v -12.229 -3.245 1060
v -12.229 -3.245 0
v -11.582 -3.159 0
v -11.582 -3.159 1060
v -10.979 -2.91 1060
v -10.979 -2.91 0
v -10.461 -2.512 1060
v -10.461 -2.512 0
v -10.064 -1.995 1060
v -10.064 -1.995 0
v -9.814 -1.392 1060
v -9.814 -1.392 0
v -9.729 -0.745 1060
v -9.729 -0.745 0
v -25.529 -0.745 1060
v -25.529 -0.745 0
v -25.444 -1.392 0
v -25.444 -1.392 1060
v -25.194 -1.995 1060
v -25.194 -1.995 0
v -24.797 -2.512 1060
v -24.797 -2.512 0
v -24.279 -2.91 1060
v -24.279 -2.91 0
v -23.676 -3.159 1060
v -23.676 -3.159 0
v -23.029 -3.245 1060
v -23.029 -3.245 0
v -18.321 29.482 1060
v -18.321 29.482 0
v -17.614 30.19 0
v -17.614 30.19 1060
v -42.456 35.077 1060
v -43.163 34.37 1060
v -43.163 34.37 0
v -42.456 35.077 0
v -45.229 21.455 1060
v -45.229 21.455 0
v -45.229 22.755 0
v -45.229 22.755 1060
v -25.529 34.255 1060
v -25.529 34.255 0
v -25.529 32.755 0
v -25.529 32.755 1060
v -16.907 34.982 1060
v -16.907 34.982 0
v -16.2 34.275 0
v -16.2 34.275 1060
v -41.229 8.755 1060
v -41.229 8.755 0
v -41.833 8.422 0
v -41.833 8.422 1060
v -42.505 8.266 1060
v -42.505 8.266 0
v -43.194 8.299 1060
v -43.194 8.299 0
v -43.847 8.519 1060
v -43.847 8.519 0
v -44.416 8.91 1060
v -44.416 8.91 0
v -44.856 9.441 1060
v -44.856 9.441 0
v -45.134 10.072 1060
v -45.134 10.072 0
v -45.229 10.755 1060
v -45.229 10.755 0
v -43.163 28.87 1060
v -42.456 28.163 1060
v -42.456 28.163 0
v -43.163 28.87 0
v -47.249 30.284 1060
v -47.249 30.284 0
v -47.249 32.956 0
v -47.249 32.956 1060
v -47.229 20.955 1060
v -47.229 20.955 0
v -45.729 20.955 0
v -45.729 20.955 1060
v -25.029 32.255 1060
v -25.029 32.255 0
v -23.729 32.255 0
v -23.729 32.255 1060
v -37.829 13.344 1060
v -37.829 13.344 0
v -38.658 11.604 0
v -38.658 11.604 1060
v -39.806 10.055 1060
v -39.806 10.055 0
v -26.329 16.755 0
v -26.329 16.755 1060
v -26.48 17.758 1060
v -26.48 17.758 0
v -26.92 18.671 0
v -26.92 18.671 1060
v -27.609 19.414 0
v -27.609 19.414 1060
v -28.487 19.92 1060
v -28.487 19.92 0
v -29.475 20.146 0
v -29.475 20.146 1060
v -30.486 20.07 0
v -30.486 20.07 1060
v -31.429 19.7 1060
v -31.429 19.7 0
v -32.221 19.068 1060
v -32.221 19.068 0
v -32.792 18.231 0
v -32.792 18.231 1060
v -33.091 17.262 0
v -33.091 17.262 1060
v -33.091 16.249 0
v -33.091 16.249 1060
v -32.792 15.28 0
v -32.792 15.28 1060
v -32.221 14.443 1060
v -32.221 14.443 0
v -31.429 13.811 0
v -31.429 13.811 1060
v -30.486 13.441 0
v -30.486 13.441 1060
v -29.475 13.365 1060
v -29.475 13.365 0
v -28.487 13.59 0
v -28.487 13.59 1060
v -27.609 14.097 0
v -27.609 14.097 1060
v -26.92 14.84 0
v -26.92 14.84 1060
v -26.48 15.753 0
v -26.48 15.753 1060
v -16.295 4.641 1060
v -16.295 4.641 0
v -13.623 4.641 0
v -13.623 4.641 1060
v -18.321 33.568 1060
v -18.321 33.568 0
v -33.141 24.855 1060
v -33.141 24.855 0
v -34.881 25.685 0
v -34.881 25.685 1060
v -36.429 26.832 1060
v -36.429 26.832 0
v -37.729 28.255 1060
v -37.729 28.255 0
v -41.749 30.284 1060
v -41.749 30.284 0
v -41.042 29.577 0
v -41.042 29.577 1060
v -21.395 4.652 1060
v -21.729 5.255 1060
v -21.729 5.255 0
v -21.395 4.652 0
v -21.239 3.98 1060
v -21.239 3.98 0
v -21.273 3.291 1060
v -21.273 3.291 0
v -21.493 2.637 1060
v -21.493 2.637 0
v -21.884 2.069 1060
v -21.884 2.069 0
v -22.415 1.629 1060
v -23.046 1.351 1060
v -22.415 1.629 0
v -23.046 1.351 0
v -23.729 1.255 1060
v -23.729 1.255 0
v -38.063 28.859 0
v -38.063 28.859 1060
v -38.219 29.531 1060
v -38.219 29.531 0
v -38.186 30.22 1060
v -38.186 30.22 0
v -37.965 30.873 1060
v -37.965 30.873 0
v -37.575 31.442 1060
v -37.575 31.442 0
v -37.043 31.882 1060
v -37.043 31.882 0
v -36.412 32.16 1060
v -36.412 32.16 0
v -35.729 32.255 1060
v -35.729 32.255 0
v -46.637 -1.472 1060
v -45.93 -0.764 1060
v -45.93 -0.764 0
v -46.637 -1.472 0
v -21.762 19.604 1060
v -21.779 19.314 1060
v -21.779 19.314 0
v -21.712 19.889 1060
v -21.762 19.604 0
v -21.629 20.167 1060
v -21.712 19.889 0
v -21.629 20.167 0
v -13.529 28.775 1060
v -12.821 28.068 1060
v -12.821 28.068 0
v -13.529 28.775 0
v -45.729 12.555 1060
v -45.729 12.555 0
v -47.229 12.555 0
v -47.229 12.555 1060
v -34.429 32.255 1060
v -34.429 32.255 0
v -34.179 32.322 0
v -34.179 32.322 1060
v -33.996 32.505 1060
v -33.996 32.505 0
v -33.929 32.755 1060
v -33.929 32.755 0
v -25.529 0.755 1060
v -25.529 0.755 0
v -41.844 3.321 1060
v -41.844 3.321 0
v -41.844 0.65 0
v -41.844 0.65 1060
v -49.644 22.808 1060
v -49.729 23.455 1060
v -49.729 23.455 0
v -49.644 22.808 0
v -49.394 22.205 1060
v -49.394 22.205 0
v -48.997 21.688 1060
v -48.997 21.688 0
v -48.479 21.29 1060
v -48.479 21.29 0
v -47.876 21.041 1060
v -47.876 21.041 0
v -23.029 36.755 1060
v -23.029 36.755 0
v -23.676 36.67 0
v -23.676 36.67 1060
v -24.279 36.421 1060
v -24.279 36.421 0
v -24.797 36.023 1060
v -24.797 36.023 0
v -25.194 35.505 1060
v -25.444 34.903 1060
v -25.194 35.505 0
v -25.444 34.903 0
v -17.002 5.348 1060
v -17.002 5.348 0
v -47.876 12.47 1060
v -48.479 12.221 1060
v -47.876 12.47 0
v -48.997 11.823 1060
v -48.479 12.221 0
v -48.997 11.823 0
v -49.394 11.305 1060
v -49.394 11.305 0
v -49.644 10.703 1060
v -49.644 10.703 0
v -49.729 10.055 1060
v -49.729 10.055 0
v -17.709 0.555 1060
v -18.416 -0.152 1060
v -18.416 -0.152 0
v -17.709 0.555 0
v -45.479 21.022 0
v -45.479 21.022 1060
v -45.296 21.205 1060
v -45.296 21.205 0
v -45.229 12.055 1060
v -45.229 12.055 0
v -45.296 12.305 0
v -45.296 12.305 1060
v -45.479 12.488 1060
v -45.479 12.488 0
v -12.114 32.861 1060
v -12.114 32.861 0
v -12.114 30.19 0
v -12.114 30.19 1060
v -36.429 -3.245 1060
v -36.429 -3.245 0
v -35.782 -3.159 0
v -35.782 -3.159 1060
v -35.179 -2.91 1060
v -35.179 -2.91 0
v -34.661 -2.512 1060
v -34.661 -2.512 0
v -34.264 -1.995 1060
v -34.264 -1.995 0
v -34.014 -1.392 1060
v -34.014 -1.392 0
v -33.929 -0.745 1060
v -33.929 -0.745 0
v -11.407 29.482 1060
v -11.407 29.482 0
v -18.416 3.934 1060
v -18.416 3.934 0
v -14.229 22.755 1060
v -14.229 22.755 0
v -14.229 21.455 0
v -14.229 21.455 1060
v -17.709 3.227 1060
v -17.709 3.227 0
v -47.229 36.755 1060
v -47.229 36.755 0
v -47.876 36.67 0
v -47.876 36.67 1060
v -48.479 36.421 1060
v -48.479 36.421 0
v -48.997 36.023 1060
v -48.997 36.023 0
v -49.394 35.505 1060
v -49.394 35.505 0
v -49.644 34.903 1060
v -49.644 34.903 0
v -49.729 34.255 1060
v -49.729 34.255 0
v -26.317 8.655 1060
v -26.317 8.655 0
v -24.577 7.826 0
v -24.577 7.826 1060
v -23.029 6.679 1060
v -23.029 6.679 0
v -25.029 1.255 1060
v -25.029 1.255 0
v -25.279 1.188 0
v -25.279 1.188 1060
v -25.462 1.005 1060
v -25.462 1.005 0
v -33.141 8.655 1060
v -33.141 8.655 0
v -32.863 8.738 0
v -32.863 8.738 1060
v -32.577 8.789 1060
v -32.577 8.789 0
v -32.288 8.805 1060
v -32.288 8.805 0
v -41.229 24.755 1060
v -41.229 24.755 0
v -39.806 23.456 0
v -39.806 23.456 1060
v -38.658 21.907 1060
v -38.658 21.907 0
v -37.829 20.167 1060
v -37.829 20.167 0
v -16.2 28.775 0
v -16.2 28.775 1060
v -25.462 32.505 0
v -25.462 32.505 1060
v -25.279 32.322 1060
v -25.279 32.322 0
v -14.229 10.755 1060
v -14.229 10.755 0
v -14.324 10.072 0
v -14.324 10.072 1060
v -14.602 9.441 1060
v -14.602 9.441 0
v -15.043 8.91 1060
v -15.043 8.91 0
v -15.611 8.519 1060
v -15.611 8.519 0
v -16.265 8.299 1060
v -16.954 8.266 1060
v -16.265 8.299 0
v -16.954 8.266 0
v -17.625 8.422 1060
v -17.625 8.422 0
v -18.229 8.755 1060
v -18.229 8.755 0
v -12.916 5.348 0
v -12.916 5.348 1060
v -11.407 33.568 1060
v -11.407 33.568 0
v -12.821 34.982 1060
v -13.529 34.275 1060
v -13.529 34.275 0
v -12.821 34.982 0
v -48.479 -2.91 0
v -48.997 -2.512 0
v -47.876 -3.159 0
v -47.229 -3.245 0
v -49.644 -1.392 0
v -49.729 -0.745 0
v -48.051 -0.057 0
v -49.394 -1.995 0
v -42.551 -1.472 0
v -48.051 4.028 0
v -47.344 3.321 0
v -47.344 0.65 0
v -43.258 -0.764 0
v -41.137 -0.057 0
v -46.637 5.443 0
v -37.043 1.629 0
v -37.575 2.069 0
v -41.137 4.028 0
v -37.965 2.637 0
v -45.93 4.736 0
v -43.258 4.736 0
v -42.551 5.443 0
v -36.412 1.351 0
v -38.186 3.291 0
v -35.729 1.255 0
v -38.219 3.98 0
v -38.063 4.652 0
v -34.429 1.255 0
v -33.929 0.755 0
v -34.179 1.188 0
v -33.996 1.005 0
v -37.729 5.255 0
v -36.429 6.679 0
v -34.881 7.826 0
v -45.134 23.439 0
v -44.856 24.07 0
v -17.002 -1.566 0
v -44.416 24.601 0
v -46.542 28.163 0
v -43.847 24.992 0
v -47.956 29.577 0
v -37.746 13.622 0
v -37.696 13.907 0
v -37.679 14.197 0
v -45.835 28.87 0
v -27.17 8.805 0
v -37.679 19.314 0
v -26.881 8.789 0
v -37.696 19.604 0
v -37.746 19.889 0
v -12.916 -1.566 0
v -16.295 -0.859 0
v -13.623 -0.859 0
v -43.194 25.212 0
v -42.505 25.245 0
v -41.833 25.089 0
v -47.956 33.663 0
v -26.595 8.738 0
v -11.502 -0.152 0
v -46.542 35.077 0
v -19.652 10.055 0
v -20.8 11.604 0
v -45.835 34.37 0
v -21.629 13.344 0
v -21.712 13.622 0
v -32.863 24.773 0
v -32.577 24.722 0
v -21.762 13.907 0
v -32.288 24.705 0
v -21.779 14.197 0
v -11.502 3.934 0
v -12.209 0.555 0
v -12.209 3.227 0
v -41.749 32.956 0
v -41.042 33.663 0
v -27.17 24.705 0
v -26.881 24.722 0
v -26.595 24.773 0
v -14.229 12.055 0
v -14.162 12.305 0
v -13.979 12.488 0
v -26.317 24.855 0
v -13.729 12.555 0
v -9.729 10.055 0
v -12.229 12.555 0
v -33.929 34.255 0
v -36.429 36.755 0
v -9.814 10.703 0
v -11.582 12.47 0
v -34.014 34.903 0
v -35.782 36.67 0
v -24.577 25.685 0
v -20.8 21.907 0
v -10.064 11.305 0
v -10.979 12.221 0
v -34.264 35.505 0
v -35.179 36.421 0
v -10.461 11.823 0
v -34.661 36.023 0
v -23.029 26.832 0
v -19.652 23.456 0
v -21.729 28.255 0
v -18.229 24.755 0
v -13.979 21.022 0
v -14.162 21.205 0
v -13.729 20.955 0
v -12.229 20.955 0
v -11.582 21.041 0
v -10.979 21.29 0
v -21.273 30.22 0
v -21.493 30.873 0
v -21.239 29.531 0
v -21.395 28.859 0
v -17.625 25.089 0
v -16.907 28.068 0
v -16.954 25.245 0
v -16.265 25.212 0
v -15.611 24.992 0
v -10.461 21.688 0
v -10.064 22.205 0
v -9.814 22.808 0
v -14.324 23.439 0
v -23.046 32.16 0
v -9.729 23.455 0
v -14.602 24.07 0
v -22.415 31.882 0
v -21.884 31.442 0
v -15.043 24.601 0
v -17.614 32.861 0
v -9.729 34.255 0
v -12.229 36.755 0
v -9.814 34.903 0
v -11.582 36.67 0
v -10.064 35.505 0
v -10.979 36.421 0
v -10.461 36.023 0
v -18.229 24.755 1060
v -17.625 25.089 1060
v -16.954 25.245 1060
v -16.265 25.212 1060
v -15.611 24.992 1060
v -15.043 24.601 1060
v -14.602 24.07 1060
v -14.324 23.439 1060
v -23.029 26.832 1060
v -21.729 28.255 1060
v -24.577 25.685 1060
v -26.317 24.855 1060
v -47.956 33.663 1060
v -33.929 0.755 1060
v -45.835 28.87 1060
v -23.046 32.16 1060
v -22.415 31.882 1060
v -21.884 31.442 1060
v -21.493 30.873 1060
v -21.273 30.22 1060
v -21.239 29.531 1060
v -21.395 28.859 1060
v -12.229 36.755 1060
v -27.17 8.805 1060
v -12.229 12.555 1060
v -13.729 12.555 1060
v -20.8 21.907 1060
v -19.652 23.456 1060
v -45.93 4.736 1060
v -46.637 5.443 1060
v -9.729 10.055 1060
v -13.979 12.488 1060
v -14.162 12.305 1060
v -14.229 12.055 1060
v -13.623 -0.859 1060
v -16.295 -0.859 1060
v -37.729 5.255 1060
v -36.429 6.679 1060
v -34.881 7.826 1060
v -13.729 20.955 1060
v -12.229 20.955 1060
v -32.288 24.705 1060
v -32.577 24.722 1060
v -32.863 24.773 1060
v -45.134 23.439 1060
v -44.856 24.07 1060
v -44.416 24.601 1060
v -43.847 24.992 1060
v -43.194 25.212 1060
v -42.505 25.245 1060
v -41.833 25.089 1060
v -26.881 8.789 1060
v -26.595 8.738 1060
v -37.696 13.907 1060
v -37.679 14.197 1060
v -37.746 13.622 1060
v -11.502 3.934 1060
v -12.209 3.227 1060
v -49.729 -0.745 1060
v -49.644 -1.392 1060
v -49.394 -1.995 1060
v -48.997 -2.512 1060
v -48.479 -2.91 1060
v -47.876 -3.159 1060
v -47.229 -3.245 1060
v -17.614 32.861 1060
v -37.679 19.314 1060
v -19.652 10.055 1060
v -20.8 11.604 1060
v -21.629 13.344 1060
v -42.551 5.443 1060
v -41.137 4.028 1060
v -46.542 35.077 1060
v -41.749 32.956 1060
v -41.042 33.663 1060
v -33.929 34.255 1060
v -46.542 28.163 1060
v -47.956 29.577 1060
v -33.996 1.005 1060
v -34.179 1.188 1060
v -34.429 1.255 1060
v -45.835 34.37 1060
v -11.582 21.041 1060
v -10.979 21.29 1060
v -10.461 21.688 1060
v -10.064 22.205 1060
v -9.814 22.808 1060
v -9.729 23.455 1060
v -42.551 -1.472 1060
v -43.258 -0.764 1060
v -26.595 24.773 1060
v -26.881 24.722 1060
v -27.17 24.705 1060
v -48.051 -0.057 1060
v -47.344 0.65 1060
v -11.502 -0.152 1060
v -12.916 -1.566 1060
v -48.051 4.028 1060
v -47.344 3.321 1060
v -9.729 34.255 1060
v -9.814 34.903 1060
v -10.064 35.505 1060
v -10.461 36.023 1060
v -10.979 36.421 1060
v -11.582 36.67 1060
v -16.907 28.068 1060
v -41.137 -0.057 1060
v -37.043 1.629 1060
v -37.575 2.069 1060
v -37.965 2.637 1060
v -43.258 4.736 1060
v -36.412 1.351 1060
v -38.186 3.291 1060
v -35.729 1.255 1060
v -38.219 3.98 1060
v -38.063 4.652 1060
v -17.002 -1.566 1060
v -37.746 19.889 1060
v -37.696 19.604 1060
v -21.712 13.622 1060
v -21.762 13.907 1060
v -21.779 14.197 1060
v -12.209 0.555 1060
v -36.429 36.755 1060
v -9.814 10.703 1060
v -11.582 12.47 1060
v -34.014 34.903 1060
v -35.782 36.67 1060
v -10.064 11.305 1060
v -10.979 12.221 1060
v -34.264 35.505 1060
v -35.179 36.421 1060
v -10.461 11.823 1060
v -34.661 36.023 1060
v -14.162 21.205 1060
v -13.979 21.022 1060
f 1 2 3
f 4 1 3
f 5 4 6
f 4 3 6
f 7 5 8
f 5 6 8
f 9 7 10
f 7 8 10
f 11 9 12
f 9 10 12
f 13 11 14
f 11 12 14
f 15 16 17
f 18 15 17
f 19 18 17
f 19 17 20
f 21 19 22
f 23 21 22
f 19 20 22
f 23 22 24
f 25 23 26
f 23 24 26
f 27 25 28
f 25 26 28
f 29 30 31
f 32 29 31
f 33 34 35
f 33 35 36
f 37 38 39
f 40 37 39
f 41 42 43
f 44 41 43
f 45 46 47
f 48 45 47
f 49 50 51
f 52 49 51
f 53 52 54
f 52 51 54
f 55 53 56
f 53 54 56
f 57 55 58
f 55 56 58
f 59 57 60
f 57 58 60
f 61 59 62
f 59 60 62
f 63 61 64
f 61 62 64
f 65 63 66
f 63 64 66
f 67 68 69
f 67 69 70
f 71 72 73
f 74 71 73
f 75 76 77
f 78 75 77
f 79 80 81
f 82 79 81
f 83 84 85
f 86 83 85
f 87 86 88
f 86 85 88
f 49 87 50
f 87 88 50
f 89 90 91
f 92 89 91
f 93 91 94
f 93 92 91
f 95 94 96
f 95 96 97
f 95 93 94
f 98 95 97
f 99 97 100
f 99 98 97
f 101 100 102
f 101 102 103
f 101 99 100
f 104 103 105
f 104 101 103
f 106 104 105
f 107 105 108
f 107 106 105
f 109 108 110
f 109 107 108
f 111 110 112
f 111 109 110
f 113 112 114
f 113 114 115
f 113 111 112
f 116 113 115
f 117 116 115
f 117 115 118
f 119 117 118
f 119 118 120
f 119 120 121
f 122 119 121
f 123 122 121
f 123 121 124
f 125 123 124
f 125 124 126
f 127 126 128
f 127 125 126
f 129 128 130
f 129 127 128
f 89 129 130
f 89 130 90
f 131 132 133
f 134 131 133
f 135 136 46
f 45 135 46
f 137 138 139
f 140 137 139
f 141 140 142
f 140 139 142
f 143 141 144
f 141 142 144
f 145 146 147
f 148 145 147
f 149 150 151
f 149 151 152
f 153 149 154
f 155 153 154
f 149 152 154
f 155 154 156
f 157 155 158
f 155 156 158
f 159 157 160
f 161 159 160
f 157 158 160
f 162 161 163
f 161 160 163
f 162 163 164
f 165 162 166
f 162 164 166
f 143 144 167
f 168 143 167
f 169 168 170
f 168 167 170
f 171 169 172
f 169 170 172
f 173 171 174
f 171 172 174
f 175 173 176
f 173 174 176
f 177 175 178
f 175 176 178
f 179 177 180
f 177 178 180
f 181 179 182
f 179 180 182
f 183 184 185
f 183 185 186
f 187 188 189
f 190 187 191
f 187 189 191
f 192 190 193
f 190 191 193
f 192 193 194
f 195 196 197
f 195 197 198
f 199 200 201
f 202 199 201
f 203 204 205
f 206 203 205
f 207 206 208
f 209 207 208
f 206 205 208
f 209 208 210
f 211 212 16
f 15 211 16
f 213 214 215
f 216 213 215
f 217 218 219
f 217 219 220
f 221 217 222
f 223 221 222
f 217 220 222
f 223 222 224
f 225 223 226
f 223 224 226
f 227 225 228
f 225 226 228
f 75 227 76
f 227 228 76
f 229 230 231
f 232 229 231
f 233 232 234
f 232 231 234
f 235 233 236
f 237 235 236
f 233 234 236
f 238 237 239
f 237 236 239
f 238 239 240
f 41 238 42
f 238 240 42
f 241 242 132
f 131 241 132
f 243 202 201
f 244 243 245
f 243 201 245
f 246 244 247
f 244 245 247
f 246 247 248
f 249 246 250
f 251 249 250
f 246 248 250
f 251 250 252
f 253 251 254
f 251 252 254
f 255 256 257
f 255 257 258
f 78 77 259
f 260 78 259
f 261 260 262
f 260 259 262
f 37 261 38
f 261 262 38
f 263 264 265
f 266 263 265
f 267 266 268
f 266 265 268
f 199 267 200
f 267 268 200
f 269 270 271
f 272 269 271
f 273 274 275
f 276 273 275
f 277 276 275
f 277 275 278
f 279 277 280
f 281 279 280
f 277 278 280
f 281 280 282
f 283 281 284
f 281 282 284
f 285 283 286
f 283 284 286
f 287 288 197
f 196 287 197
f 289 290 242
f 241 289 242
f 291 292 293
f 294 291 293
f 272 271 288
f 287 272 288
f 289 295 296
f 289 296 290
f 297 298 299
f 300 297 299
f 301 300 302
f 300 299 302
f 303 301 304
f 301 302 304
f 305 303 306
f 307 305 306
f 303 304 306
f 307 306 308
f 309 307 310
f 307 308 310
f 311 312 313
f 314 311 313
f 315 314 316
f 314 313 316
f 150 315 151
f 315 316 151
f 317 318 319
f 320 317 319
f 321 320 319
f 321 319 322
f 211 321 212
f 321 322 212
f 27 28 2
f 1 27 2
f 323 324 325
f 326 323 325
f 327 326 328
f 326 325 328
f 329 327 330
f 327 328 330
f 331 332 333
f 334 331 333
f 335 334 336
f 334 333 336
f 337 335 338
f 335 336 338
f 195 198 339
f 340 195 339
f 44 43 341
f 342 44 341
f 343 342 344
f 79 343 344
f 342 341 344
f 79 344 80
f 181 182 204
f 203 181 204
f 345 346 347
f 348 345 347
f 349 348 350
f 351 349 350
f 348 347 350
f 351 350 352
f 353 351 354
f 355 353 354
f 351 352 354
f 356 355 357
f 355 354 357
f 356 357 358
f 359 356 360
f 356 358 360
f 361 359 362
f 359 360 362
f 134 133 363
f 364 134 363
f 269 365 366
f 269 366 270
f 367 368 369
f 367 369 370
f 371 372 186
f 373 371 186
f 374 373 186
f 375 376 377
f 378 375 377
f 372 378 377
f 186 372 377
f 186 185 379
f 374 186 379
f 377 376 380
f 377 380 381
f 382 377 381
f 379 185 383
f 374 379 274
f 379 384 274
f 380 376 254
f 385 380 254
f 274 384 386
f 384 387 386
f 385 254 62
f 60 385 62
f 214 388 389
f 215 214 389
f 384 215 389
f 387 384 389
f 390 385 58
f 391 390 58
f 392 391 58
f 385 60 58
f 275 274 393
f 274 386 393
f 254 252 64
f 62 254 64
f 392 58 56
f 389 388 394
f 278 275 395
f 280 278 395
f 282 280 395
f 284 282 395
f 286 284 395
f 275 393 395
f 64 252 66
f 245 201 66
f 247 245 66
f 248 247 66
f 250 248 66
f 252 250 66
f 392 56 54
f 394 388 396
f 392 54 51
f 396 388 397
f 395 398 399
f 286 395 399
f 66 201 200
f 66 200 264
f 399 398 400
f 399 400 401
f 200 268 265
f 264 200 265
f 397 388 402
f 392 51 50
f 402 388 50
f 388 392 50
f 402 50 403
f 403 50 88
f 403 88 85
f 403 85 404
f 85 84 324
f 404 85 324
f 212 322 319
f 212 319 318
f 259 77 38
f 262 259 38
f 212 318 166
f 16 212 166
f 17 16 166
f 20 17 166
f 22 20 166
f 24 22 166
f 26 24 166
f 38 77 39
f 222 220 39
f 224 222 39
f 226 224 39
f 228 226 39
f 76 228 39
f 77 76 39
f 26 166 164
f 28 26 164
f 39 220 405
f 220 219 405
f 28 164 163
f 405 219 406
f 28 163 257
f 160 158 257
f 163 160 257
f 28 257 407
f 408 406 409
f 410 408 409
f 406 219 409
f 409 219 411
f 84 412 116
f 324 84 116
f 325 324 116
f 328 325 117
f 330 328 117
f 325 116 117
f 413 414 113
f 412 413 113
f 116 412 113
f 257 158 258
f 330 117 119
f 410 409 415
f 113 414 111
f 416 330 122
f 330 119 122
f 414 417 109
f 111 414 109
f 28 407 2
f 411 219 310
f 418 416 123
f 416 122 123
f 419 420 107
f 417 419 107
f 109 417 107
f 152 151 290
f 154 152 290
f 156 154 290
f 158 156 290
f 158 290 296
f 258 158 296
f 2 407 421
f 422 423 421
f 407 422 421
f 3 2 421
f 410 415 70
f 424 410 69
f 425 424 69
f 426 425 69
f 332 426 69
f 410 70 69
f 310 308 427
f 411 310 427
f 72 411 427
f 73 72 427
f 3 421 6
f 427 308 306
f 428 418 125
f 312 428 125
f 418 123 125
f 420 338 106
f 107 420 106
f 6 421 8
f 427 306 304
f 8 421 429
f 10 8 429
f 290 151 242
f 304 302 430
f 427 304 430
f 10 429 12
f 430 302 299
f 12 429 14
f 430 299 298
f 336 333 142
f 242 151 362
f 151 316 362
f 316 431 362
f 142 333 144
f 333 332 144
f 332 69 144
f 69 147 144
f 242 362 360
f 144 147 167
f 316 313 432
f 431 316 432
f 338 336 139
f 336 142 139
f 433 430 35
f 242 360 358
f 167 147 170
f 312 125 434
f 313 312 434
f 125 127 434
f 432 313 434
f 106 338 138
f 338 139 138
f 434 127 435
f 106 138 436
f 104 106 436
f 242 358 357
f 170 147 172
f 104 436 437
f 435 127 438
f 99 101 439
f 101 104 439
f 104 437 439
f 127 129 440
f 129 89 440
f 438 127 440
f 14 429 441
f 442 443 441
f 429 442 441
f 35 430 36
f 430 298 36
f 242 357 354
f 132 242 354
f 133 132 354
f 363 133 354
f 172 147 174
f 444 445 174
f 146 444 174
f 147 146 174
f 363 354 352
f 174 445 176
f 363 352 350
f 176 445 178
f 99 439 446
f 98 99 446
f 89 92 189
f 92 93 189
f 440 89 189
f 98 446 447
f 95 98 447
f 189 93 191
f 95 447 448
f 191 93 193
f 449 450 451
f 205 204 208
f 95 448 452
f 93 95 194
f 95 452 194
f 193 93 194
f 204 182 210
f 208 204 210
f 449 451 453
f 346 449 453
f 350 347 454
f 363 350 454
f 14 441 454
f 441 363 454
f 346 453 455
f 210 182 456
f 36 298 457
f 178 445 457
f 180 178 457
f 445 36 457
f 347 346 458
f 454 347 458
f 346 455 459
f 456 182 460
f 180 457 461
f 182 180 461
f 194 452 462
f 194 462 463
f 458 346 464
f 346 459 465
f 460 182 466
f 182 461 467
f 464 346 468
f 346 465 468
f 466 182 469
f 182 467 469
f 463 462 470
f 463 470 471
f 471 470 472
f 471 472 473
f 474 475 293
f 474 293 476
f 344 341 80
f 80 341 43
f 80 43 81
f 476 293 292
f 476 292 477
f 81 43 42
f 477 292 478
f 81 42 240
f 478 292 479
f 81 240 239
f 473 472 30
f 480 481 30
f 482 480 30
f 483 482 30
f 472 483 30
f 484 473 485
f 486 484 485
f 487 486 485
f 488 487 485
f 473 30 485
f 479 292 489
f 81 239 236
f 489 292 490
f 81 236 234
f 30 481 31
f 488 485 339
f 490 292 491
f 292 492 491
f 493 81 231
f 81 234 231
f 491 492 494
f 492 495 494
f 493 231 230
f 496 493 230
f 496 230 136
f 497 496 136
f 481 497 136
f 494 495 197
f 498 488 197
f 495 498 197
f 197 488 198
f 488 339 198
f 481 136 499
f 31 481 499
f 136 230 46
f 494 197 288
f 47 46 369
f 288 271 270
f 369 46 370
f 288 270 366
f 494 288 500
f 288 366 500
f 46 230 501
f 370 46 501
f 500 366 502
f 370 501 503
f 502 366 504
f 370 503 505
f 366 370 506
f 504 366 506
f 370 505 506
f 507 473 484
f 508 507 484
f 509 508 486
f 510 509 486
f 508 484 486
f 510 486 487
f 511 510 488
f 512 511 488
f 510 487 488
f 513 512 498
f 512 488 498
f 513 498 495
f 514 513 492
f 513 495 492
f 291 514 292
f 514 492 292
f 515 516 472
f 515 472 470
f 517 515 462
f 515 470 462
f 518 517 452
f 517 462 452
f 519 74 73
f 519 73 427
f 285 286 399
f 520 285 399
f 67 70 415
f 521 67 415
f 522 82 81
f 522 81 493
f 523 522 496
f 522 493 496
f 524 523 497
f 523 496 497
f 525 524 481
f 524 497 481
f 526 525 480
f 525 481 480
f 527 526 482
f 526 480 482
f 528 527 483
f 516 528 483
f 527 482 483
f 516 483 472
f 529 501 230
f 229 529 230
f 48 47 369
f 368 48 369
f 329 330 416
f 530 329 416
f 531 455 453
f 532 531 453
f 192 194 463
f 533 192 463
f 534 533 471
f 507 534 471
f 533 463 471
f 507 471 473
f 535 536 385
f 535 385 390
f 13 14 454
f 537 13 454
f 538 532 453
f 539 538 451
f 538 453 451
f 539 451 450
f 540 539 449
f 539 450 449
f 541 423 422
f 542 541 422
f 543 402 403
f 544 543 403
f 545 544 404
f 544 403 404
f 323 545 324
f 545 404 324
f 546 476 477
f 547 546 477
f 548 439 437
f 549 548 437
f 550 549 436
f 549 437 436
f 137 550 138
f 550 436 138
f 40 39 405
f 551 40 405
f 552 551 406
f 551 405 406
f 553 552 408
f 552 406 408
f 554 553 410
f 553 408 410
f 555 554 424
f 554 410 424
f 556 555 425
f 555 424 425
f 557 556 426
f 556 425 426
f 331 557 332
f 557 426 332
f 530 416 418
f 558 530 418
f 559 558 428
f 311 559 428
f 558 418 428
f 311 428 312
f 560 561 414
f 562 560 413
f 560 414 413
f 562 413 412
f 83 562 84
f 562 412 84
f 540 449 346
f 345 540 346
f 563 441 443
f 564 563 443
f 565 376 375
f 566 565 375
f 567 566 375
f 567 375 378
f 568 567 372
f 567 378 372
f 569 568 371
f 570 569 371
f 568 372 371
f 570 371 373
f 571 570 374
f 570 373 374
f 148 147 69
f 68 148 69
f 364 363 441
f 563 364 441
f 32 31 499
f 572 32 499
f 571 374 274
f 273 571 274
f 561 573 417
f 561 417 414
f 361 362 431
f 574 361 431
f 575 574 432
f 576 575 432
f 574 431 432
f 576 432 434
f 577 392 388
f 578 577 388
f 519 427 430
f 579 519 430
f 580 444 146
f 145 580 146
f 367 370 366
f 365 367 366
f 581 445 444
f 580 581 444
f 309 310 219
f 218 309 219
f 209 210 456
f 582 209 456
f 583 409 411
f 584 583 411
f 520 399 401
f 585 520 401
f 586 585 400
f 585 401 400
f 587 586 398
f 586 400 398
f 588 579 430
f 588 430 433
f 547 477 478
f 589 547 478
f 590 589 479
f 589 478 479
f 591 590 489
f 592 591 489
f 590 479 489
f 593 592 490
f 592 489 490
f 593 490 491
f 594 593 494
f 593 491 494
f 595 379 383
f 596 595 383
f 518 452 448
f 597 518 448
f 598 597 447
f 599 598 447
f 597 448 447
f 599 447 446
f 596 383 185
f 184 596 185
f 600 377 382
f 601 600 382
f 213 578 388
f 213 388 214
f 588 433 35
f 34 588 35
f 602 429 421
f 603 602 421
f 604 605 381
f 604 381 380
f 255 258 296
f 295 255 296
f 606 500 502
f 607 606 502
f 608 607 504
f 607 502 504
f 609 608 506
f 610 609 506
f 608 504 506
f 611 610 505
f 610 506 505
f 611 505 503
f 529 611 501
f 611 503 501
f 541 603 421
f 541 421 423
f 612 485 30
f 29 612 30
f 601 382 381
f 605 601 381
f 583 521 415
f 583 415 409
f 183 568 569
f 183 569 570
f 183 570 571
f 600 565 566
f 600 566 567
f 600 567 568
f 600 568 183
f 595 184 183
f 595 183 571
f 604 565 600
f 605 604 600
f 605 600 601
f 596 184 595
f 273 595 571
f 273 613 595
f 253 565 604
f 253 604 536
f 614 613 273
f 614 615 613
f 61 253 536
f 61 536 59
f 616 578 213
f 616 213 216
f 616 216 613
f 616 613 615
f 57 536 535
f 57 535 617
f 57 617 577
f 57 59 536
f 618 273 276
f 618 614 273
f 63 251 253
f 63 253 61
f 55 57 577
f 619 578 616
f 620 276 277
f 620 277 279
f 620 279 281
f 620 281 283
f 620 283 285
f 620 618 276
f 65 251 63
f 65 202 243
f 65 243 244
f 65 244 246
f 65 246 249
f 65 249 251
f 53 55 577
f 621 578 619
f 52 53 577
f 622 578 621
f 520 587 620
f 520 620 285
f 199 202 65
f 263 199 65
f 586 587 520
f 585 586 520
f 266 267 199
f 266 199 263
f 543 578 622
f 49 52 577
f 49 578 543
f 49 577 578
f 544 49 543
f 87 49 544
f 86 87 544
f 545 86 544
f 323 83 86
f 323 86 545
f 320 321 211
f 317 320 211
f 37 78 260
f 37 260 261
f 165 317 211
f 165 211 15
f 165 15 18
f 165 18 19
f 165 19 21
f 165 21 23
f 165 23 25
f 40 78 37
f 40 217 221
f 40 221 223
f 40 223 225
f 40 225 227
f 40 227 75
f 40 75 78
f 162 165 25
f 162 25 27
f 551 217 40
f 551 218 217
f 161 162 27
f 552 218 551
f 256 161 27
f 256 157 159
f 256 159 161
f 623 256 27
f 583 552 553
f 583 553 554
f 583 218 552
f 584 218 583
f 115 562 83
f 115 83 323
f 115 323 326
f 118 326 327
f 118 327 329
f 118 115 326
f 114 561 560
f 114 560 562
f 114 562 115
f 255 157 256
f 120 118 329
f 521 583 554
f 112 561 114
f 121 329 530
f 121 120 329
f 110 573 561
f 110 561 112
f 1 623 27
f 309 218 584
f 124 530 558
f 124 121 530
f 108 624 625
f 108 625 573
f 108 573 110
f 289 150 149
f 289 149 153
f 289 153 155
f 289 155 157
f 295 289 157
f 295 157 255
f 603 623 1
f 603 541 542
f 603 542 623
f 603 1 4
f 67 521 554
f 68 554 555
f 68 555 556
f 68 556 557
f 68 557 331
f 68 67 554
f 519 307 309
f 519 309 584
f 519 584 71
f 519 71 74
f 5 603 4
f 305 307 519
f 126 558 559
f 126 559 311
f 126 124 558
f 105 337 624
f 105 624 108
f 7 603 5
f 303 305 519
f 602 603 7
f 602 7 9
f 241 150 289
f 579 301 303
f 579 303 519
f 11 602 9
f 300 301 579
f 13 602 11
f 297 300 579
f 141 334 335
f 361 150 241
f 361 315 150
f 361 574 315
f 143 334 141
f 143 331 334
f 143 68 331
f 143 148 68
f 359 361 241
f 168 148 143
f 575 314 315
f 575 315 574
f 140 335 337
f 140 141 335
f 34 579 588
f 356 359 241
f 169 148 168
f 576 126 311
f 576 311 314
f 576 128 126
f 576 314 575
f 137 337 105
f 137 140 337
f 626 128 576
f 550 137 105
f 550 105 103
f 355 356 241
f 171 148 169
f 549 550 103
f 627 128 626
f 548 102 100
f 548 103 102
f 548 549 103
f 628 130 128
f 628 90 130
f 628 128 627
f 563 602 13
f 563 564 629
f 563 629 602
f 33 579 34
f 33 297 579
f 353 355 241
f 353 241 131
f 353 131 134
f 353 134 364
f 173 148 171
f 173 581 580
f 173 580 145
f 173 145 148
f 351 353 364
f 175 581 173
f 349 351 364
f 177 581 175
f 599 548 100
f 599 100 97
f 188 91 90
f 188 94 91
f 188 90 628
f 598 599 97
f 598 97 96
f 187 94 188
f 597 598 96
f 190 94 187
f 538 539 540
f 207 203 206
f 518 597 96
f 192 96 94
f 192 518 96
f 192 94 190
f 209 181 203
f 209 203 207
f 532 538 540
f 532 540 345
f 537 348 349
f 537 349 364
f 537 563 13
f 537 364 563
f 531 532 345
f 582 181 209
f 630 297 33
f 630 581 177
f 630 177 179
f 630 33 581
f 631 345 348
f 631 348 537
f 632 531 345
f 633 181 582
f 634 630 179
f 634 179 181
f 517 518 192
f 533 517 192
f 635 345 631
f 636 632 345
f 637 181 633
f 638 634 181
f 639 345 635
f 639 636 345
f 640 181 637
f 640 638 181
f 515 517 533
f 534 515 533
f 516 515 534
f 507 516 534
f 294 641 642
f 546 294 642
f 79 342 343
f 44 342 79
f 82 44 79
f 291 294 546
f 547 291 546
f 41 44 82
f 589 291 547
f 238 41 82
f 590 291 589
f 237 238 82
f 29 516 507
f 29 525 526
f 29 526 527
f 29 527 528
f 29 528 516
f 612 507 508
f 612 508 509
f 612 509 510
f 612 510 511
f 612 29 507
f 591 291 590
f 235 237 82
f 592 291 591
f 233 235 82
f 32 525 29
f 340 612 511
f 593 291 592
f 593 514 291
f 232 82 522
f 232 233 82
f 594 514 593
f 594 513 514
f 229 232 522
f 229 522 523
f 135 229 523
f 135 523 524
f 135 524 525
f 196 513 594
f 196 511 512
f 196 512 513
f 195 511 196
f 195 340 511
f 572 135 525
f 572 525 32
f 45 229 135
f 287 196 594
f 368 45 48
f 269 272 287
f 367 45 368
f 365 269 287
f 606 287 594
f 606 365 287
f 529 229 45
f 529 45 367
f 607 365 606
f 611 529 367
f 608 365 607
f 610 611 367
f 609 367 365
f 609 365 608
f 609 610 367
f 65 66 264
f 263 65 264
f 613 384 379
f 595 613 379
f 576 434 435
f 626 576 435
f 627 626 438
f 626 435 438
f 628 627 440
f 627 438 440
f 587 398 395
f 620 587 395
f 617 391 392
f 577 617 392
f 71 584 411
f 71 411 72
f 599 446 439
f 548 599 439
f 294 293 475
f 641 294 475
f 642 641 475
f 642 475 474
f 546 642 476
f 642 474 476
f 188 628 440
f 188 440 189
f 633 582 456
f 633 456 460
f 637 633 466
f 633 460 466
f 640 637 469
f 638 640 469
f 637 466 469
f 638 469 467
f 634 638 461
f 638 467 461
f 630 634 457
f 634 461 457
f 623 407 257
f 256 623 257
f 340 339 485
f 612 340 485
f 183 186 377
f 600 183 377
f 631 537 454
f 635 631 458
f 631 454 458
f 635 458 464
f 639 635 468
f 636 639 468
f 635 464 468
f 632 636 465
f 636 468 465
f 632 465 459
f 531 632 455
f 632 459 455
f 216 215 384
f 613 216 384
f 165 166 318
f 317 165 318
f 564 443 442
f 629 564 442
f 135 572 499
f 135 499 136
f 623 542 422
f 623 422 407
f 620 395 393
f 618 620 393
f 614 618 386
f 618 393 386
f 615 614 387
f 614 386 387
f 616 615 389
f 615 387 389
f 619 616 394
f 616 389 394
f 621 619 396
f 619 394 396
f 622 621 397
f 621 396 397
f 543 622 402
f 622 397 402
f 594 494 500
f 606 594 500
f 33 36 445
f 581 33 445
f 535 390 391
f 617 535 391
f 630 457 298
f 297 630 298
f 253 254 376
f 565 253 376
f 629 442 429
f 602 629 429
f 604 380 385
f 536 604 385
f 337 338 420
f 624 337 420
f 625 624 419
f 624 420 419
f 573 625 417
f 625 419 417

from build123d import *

# Parameters (mm, degrees)
F0_R     = 3.4
F1_DEPTH = 1060


# Not quite as in the source:
# - ends of sketch curves that miss each other by under 0.0002 mm in the source are joined


with BuildPart() as f1:
    # F0 (on Top) → F1 (new body)
    with BuildSketch(Plane.XY):
        with BuildLine():
            ThreePointArc((-37.8290628647, 13.3437199509), (-39.194573333, 10.8017277117), (-41.229063, 8.755464))
            ThreePointArc((-41.229063, 8.755464), (-43.8470969887, 8.5193960225), (-45.229063, 10.755464))
            Line((-45.229063, 10.755464), (-45.229063, 12.055464))
            ThreePointArc((-45.229063, 12.055464), (-45.3755096094, 12.4090173906), (-45.729063, 12.555464))
            Line((-45.729063, 12.555464), (-47.229063, 12.555464))
            ThreePointArc((-47.229063, 12.555464), (-48.996829953, 11.823230953), (-49.729063, 10.055464))
            Line((-49.729063, 10.055464), (-49.729063, -0.744536))
            ThreePointArc((-49.729063, -0.744536), (-48.996829953, -2.512302953), (-47.229063, -3.244536))
            Line((-47.229063, -3.244536), (-36.429063, -3.244536))
            ThreePointArc((-36.429063, -3.244536), (-34.661296047, -2.512302953), (-33.929063, -0.744536))
            Line((-33.929063, -0.744536), (-33.929063, 0.755464))
            ThreePointArc((-33.929063, 0.755464), (-34.0755096094, 1.1090173906), (-34.429063, 1.255464))
            Line((-34.429063, 1.255464), (-35.729063, 1.255464))
            ThreePointArc((-35.729063, 1.255464), (-37.9651309775, 2.6374300113), (-37.729063, 5.255464))
            ThreePointArc((-37.729063, 5.255464), (-35.6827992883, 7.289953667), (-33.1408070491, 8.6554641353))
            ThreePointArc((-33.1408070491, 8.6554641353), (-32.7208836531, 8.767678459), (-32.287871, 8.805464))
            Line((-32.287871, 8.805464), (-27.170255, 8.805464))
            ThreePointArc((-27.170255, 8.805464), (-26.7372423469, 8.767678459), (-26.3173189877, 8.6554640338))
            ThreePointArc((-26.3173189877, 8.6554640338), (-23.7753267117, 7.289953667), (-21.729063, 5.255464))
            ThreePointArc((-21.729063, 5.255464), (-21.4929950225, 2.6374300113), (-23.729063, 1.255464))
            Line((-23.729063, 1.255464), (-25.029063, 1.255464))
            ThreePointArc((-25.029063, 1.255464), (-25.3826163906, 1.1090173906), (-25.529063, 0.755464))
            Line((-25.529063, 0.755464), (-25.529063, -0.744536))
            ThreePointArc((-25.529063, -0.744536), (-24.796829953, -2.512302953), (-23.029063, -3.244536))
            Line((-23.029063, -3.244536), (-12.229063, -3.244536))
            ThreePointArc((-12.229063, -3.244536), (-10.461296047, -2.512302953), (-9.729063, -0.744536))
            Line((-9.729063, -0.744536), (-9.729063, 10.055464))
            ThreePointArc((-9.729063, 10.055464), (-10.461296047, 11.823230953), (-12.229063, 12.555464))
            Line((-12.229063, 12.555464), (-13.729063, 12.555464))
            ThreePointArc((-13.729063, 12.555464), (-14.0826163906, 12.4090173906), (-14.229063, 12.055464))
            Line((-14.229063, 12.055464), (-14.229063, 10.755464))
            ThreePointArc((-14.229063, 10.755464), (-15.6110290113, 8.5193960225), (-18.229063, 8.755464))
            ThreePointArc((-18.229063, 8.755464), (-20.263552667, 10.8017277117), (-21.6290631353, 13.3437199509))
            ThreePointArc((-21.6290631353, 13.3437199509), (-21.741277459, 13.7636433469), (-21.779063, 14.196656))
            Line((-21.779063, 14.196656), (-21.779063, 19.314273))
            ThreePointArc((-21.779063, 19.314273), (-21.741277459, 19.7472856531), (-21.6290630338, 20.1672090123))
            ThreePointArc((-21.6290630338, 20.1672090123), (-20.2635523872, 22.7092006659), (-18.229063, 24.755464))
            ThreePointArc((-18.229063, 24.755464), (-15.6110290113, 24.9915319775), (-14.229063, 22.755464))
            Line((-14.229063, 22.755464), (-14.229063, 21.455464))
            ThreePointArc((-14.229063, 21.455464), (-14.0826163906, 21.1019106094), (-13.729063, 20.955464))
            Line((-13.729063, 20.955464), (-12.229063, 20.955464))
            ThreePointArc((-12.229063, 20.955464), (-10.461296047, 21.687697047), (-9.729063, 23.455464))
            Line((-9.729063, 23.455464), (-9.729063, 34.255464))
            ThreePointArc((-9.729063, 34.255464), (-10.461296047, 36.023230953), (-12.229063, 36.755464))
            Line((-12.229063, 36.755464), (-23.029063, 36.755464))
            ThreePointArc((-23.029063, 36.755464), (-24.796829953, 36.023230953), (-25.529063, 34.255464))
            Line((-25.529063, 34.255464), (-25.529063, 32.755464))
            ThreePointArc((-25.529063, 32.755464), (-25.3826163906, 32.4019106094), (-25.029063, 32.255464))
            Line((-25.029063, 32.255464), (-23.729063, 32.255464))
            ThreePointArc((-23.729063, 32.255464), (-21.4929950225, 30.8734979887), (-21.729063, 28.255464))
            ThreePointArc((-21.729063, 28.255464), (-23.7753267117, 26.220974333), (-26.3173189509, 24.8554638647))
            ThreePointArc((-26.3173189509, 24.8554638647), (-26.7372423469, 24.743249541), (-27.170255, 24.705464))
            Line((-27.170255, 24.705464), (-32.287871, 24.705464))
            ThreePointArc((-32.287871, 24.705464), (-32.7208836531, 24.743249541), (-33.1408070123, 24.8554639662))
            ThreePointArc((-33.1408070123, 24.8554639662), (-35.6827992883, 26.220974333), (-37.729063, 28.255464))
            ThreePointArc((-37.729063, 28.255464), (-37.9651309775, 30.8734979887), (-35.729063, 32.255464))
            Line((-35.729063, 32.255464), (-34.429063, 32.255464))
            ThreePointArc((-34.429063, 32.255464), (-34.0755096094, 32.4019106094), (-33.929063, 32.755464))
            Line((-33.929063, 32.755464), (-33.929063, 34.255464))
            ThreePointArc((-33.929063, 34.255464), (-34.661296047, 36.023230953), (-36.429063, 36.755464))
            Line((-36.429063, 36.755464), (-47.229063, 36.755464))
            ThreePointArc((-47.229063, 36.755464), (-48.996829953, 36.023230953), (-49.729063, 34.255464))
            Line((-49.729063, 34.255464), (-49.729063, 23.455464))
            ThreePointArc((-49.729063, 23.455464), (-48.996829953, 21.687697047), (-47.229063, 20.955464))
            Line((-47.229063, 20.955464), (-45.729063, 20.955464))
            ThreePointArc((-45.729063, 20.955464), (-45.3755096094, 21.1019106094), (-45.229063, 21.455464))
            Line((-45.229063, 21.455464), (-45.229063, 22.755464))
            ThreePointArc((-45.229063, 22.755464), (-43.8470969887, 24.9915319775), (-41.229063, 24.755464))
            ThreePointArc((-41.229063, 24.755464), (-39.1945736128, 22.7092006659), (-37.8290631854, 20.1672089327))
            ThreePointArc((-37.8290631854, 20.1672089327), (-37.716848541, 19.7472856531), (-37.679063, 19.314273))
            Line((-37.679063, 19.314273), (-37.679063, 14.196656))
            ThreePointArc((-37.679063, 14.196656), (-37.716848541, 13.7636433469), (-37.8290628647, 13.3437199509))
        make_face()
        Polygon((-43.257983, -0.764408), (-45.929556, -0.764408), (-46.636663, -1.471515), (-48.050877, -0.057301), (-47.34377, 0.649805), (-47.34377, 3.321378), (-48.050877, 4.028485), (-46.636663, 5.442699), (-45.929556, 4.735592), (-43.257983, 4.735592), (-42.550877, 5.442699), (-41.136663, 4.028485), (-41.84377, 3.321378), (-41.84377, 0.649805), (-41.136663, -0.057301), (-42.550877, -1.471515), align=None, mode=Mode.SUBTRACT)
        Polygon((-12.20919, 3.226544), (-12.20919, 0.554971), (-11.502084, -0.152136), (-12.916297, -1.566349), (-13.623404, -0.859242), (-16.294977, -0.859242), (-17.002084, -1.566349), (-18.416297, -0.152136), (-17.70919, 0.554971), (-17.70919, 3.226544), (-18.416297, 3.933651), (-17.002084, 5.347864), (-16.294977, 4.640758), (-13.623404, 4.640758), (-12.916297, 5.347864), (-11.502084, 3.933651), align=None, mode=Mode.SUBTRACT)
        with Locations((-29.729063, 16.755464)):
            Circle(F0_R, mode=Mode.SUBTRACT)
        Polygon((-47.248935, 30.284385), (-47.248935, 32.955957), (-47.956042, 33.663064), (-46.541829, 35.077278), (-45.834722, 34.370171), (-43.163149, 34.370171), (-42.456042, 35.077278), (-41.041829, 33.663064), (-41.748935, 32.955957), (-41.748935, 30.284385), (-41.041829, 29.577278), (-42.456042, 28.163064), (-43.163149, 28.870171), (-45.834722, 28.870171), (-46.541829, 28.163064), (-47.956042, 29.577278), align=None, mode=Mode.SUBTRACT)
        Polygon((-16.200143, 34.275337), (-13.52857, 34.275337), (-12.821463, 34.982444), (-11.407249, 33.56823), (-12.114356, 32.861123), (-12.114356, 30.18955), (-11.407249, 29.482444), (-12.821463, 28.06823), (-13.52857, 28.775337), (-16.200143, 28.775337), (-16.907249, 28.06823), (-18.321463, 29.482444), (-17.614356, 30.18955), (-17.614356, 32.861123), (-18.321463, 33.56823), (-16.907249, 34.982444), align=None, mode=Mode.SUBTRACT)
    extrude(amount=F1_DEPTH)


solid = f1.part
